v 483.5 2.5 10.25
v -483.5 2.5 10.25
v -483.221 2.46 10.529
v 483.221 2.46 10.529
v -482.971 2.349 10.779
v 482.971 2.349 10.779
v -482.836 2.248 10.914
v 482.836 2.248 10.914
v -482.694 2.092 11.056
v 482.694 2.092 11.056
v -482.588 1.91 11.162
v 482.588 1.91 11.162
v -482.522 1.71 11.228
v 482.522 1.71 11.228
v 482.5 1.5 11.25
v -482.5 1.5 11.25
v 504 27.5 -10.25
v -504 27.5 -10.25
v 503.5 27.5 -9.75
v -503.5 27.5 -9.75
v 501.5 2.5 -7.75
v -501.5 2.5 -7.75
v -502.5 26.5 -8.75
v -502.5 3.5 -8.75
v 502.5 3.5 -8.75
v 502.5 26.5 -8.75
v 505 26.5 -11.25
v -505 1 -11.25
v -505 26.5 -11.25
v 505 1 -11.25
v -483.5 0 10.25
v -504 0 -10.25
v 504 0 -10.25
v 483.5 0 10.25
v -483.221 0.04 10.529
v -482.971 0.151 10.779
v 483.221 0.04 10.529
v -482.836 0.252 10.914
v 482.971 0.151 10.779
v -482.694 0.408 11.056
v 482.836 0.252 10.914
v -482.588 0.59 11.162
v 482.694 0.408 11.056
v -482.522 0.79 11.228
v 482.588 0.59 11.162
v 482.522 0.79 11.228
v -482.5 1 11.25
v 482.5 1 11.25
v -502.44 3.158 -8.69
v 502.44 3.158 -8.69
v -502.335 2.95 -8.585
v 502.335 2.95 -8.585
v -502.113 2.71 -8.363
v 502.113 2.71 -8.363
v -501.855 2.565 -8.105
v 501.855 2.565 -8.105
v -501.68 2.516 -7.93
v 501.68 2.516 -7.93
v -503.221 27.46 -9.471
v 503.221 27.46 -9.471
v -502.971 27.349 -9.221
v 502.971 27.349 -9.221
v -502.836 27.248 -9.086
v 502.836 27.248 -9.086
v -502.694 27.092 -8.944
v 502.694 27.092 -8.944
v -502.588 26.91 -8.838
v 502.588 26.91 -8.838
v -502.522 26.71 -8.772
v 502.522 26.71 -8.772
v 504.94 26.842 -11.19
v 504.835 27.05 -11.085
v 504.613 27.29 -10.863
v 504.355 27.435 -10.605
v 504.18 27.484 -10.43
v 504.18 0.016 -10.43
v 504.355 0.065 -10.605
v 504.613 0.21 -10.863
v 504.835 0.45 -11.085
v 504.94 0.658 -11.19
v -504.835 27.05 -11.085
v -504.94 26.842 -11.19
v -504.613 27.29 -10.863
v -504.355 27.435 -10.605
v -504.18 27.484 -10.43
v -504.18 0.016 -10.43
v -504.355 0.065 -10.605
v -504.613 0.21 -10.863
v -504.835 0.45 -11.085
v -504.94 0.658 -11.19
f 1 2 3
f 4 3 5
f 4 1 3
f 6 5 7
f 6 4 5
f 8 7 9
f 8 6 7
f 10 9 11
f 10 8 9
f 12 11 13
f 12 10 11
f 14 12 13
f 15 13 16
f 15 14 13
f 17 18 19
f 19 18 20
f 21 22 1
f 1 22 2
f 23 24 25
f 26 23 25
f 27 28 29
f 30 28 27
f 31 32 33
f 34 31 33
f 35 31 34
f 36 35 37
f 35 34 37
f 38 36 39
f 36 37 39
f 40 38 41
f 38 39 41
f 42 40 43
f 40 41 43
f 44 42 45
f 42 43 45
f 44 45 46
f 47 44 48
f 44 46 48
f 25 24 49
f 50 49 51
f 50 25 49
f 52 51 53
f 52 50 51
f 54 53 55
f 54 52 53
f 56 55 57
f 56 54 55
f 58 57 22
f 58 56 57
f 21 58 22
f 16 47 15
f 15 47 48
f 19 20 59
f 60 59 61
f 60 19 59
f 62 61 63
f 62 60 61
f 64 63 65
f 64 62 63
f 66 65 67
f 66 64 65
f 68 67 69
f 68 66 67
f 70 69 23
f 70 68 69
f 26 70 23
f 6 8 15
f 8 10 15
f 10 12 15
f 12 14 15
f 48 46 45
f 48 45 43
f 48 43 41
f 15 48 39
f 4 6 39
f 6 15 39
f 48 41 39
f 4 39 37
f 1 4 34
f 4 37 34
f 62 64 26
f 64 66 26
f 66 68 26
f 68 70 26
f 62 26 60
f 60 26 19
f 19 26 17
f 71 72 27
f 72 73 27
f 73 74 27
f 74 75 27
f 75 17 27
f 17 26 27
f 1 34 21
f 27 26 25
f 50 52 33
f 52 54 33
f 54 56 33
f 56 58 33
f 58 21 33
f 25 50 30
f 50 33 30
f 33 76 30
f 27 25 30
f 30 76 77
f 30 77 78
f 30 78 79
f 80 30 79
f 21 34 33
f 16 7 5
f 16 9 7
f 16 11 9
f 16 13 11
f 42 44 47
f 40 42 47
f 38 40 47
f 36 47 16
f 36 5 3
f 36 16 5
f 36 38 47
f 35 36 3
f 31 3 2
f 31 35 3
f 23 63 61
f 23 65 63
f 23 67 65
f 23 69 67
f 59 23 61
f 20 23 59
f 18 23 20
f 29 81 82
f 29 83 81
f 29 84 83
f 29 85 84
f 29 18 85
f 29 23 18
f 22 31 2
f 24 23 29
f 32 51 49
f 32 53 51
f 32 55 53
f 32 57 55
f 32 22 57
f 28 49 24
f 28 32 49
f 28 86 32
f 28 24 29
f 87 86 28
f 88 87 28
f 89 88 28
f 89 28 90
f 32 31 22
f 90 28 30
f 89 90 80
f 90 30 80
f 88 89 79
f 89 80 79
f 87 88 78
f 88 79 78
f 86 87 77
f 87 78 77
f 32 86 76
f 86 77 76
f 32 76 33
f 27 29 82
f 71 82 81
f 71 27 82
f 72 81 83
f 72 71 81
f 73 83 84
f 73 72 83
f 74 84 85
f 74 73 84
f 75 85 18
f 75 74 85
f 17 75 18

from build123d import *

# Parameters (mm, degrees)
SKETCH1_W           = 1010
SKETCH1_H           = 22.5
BOSS_EXTRUDE1_DEPTH = 2.5
SKETCH2_W           = 1010
SKETCH2_H           = 2.5
BOSS_EXTRUDE2_DEPTH = 25
CUT_EXTRUDE1_DEPTH  = 506.873316652
FILLET1_R           = 1


with BuildPart() as part:
    # Sketch1 → Boss-Extrude1 (new body)
    with BuildSketch(Plane(origin=(0, 0, 0), x_dir=(1, 0, 0), z_dir=(0, 1, 0))):
        Rectangle(SKETCH1_W, SKETCH1_H)
    extrude(amount=BOSS_EXTRUDE1_DEPTH)

    # Sketch2 → Boss-Extrude2 (add)
    with BuildSketch(Plane(origin=(0, 2.5, 0), x_dir=(1, 0, 0), z_dir=(0, 1, 0))):
        with Locations((0, 10)):
            Rectangle(SKETCH2_W, SKETCH2_H)
    extrude(amount=BOSS_EXTRUDE2_DEPTH)

    # Sketch3 → Cut-Extrude1 (cut, through all)
    with BuildSketch(Plane(origin=(0, 0, 0), x_dir=(-1, 0, 0), z_dir=(0, -1, 0))):
        Polygon((505, 11.25), (505, -11.25), (482.5, -11.25), align=None)
        Polygon((-505, 11.25), (-505, -11.25), (-482.5, -11.25), align=None)
    extrude(amount=-CUT_EXTRUDE1_DEPTH, mode=Mode.SUBTRACT)

    # Fillet1
    fillet1_edges = [part.edges().sort_by_distance(p)[0] for p in [
        (0, 27.5, -11.25),
        (0, 27.5, -8.75),
        (0, 2.5, -8.75),
        (0, 0, 11.25),
        (0, 2.5, 11.25),
        (0, 0, -11.25),
    ]]
    fillet(fillet1_edges, radius=FILLET1_R)


solid = part.part
